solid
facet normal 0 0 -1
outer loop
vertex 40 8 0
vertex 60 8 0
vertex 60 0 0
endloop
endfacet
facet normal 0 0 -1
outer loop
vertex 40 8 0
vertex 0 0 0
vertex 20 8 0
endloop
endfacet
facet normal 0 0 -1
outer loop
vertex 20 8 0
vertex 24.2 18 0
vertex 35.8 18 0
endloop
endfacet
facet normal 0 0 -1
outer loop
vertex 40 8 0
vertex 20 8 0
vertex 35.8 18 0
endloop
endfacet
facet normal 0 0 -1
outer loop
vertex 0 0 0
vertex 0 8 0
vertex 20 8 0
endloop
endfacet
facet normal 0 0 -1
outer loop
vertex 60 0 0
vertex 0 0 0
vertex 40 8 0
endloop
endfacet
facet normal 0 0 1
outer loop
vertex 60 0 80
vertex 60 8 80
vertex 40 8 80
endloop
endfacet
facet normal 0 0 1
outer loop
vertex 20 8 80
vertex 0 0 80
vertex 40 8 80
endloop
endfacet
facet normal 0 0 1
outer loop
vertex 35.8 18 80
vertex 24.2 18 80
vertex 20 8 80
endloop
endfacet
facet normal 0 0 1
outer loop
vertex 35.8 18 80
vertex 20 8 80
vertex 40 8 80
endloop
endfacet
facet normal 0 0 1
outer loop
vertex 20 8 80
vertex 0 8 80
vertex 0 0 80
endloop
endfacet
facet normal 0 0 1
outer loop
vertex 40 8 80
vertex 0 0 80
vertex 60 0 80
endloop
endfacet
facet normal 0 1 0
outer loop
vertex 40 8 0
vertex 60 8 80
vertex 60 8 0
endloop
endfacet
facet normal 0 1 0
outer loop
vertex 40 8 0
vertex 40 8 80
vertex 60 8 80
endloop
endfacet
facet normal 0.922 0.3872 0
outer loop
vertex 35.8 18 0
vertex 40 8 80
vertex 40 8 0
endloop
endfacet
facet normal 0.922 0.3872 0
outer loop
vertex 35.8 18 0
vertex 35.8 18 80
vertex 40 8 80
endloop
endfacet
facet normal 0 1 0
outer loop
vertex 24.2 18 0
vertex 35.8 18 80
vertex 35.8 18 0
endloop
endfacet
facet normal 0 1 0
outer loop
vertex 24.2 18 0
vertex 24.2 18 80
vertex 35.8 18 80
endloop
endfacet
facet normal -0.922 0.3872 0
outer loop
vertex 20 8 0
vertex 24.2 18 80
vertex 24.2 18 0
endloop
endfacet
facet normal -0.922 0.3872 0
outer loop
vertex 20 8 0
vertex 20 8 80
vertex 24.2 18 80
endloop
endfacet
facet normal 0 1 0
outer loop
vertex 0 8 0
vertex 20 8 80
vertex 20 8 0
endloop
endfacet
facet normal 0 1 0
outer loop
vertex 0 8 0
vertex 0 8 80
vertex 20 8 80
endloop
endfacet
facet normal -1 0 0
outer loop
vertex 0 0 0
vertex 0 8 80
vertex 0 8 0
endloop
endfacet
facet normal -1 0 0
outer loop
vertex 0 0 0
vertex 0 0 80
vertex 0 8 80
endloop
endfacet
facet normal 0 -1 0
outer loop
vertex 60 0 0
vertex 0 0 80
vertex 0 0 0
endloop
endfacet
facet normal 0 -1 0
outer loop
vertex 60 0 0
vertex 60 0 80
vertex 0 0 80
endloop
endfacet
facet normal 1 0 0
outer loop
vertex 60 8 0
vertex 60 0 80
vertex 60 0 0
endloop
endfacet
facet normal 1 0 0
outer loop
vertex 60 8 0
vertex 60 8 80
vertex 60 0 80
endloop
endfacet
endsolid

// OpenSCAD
$fn = 32;

// ----------------------------------------------------------------------
// V guide rail: dovetail, 60 mm wide
// ----------------------------------------------------------------------

// --- parameters (mm) ---
rail_w = 60;              // rail width, X
base_t = 8;               // base plate thickness
v_depth = 10;             // V feature depth / height
v_half_w = 10;            // half width of the V at the base face
plate_t = 80;             // rail length, Z (the extrusion height)
top_half_w = 5.8;         // half width at the dovetail top

dovetail_base = 2 * v_half_w;  // dovetail width at the base
dovetail_top = 2 * top_half_w;  // dovetail width at the top

profile = [[0, 0], [60, 0], [60, 8], [40, 8], [35.8, 18], [24.2, 18], [20, 8], [0, 8]];  // primary outline, 8 points, counter clockwise

// --- the one profile operation ---
linear_extrude(height = plate_t) polygon(points = profile);
